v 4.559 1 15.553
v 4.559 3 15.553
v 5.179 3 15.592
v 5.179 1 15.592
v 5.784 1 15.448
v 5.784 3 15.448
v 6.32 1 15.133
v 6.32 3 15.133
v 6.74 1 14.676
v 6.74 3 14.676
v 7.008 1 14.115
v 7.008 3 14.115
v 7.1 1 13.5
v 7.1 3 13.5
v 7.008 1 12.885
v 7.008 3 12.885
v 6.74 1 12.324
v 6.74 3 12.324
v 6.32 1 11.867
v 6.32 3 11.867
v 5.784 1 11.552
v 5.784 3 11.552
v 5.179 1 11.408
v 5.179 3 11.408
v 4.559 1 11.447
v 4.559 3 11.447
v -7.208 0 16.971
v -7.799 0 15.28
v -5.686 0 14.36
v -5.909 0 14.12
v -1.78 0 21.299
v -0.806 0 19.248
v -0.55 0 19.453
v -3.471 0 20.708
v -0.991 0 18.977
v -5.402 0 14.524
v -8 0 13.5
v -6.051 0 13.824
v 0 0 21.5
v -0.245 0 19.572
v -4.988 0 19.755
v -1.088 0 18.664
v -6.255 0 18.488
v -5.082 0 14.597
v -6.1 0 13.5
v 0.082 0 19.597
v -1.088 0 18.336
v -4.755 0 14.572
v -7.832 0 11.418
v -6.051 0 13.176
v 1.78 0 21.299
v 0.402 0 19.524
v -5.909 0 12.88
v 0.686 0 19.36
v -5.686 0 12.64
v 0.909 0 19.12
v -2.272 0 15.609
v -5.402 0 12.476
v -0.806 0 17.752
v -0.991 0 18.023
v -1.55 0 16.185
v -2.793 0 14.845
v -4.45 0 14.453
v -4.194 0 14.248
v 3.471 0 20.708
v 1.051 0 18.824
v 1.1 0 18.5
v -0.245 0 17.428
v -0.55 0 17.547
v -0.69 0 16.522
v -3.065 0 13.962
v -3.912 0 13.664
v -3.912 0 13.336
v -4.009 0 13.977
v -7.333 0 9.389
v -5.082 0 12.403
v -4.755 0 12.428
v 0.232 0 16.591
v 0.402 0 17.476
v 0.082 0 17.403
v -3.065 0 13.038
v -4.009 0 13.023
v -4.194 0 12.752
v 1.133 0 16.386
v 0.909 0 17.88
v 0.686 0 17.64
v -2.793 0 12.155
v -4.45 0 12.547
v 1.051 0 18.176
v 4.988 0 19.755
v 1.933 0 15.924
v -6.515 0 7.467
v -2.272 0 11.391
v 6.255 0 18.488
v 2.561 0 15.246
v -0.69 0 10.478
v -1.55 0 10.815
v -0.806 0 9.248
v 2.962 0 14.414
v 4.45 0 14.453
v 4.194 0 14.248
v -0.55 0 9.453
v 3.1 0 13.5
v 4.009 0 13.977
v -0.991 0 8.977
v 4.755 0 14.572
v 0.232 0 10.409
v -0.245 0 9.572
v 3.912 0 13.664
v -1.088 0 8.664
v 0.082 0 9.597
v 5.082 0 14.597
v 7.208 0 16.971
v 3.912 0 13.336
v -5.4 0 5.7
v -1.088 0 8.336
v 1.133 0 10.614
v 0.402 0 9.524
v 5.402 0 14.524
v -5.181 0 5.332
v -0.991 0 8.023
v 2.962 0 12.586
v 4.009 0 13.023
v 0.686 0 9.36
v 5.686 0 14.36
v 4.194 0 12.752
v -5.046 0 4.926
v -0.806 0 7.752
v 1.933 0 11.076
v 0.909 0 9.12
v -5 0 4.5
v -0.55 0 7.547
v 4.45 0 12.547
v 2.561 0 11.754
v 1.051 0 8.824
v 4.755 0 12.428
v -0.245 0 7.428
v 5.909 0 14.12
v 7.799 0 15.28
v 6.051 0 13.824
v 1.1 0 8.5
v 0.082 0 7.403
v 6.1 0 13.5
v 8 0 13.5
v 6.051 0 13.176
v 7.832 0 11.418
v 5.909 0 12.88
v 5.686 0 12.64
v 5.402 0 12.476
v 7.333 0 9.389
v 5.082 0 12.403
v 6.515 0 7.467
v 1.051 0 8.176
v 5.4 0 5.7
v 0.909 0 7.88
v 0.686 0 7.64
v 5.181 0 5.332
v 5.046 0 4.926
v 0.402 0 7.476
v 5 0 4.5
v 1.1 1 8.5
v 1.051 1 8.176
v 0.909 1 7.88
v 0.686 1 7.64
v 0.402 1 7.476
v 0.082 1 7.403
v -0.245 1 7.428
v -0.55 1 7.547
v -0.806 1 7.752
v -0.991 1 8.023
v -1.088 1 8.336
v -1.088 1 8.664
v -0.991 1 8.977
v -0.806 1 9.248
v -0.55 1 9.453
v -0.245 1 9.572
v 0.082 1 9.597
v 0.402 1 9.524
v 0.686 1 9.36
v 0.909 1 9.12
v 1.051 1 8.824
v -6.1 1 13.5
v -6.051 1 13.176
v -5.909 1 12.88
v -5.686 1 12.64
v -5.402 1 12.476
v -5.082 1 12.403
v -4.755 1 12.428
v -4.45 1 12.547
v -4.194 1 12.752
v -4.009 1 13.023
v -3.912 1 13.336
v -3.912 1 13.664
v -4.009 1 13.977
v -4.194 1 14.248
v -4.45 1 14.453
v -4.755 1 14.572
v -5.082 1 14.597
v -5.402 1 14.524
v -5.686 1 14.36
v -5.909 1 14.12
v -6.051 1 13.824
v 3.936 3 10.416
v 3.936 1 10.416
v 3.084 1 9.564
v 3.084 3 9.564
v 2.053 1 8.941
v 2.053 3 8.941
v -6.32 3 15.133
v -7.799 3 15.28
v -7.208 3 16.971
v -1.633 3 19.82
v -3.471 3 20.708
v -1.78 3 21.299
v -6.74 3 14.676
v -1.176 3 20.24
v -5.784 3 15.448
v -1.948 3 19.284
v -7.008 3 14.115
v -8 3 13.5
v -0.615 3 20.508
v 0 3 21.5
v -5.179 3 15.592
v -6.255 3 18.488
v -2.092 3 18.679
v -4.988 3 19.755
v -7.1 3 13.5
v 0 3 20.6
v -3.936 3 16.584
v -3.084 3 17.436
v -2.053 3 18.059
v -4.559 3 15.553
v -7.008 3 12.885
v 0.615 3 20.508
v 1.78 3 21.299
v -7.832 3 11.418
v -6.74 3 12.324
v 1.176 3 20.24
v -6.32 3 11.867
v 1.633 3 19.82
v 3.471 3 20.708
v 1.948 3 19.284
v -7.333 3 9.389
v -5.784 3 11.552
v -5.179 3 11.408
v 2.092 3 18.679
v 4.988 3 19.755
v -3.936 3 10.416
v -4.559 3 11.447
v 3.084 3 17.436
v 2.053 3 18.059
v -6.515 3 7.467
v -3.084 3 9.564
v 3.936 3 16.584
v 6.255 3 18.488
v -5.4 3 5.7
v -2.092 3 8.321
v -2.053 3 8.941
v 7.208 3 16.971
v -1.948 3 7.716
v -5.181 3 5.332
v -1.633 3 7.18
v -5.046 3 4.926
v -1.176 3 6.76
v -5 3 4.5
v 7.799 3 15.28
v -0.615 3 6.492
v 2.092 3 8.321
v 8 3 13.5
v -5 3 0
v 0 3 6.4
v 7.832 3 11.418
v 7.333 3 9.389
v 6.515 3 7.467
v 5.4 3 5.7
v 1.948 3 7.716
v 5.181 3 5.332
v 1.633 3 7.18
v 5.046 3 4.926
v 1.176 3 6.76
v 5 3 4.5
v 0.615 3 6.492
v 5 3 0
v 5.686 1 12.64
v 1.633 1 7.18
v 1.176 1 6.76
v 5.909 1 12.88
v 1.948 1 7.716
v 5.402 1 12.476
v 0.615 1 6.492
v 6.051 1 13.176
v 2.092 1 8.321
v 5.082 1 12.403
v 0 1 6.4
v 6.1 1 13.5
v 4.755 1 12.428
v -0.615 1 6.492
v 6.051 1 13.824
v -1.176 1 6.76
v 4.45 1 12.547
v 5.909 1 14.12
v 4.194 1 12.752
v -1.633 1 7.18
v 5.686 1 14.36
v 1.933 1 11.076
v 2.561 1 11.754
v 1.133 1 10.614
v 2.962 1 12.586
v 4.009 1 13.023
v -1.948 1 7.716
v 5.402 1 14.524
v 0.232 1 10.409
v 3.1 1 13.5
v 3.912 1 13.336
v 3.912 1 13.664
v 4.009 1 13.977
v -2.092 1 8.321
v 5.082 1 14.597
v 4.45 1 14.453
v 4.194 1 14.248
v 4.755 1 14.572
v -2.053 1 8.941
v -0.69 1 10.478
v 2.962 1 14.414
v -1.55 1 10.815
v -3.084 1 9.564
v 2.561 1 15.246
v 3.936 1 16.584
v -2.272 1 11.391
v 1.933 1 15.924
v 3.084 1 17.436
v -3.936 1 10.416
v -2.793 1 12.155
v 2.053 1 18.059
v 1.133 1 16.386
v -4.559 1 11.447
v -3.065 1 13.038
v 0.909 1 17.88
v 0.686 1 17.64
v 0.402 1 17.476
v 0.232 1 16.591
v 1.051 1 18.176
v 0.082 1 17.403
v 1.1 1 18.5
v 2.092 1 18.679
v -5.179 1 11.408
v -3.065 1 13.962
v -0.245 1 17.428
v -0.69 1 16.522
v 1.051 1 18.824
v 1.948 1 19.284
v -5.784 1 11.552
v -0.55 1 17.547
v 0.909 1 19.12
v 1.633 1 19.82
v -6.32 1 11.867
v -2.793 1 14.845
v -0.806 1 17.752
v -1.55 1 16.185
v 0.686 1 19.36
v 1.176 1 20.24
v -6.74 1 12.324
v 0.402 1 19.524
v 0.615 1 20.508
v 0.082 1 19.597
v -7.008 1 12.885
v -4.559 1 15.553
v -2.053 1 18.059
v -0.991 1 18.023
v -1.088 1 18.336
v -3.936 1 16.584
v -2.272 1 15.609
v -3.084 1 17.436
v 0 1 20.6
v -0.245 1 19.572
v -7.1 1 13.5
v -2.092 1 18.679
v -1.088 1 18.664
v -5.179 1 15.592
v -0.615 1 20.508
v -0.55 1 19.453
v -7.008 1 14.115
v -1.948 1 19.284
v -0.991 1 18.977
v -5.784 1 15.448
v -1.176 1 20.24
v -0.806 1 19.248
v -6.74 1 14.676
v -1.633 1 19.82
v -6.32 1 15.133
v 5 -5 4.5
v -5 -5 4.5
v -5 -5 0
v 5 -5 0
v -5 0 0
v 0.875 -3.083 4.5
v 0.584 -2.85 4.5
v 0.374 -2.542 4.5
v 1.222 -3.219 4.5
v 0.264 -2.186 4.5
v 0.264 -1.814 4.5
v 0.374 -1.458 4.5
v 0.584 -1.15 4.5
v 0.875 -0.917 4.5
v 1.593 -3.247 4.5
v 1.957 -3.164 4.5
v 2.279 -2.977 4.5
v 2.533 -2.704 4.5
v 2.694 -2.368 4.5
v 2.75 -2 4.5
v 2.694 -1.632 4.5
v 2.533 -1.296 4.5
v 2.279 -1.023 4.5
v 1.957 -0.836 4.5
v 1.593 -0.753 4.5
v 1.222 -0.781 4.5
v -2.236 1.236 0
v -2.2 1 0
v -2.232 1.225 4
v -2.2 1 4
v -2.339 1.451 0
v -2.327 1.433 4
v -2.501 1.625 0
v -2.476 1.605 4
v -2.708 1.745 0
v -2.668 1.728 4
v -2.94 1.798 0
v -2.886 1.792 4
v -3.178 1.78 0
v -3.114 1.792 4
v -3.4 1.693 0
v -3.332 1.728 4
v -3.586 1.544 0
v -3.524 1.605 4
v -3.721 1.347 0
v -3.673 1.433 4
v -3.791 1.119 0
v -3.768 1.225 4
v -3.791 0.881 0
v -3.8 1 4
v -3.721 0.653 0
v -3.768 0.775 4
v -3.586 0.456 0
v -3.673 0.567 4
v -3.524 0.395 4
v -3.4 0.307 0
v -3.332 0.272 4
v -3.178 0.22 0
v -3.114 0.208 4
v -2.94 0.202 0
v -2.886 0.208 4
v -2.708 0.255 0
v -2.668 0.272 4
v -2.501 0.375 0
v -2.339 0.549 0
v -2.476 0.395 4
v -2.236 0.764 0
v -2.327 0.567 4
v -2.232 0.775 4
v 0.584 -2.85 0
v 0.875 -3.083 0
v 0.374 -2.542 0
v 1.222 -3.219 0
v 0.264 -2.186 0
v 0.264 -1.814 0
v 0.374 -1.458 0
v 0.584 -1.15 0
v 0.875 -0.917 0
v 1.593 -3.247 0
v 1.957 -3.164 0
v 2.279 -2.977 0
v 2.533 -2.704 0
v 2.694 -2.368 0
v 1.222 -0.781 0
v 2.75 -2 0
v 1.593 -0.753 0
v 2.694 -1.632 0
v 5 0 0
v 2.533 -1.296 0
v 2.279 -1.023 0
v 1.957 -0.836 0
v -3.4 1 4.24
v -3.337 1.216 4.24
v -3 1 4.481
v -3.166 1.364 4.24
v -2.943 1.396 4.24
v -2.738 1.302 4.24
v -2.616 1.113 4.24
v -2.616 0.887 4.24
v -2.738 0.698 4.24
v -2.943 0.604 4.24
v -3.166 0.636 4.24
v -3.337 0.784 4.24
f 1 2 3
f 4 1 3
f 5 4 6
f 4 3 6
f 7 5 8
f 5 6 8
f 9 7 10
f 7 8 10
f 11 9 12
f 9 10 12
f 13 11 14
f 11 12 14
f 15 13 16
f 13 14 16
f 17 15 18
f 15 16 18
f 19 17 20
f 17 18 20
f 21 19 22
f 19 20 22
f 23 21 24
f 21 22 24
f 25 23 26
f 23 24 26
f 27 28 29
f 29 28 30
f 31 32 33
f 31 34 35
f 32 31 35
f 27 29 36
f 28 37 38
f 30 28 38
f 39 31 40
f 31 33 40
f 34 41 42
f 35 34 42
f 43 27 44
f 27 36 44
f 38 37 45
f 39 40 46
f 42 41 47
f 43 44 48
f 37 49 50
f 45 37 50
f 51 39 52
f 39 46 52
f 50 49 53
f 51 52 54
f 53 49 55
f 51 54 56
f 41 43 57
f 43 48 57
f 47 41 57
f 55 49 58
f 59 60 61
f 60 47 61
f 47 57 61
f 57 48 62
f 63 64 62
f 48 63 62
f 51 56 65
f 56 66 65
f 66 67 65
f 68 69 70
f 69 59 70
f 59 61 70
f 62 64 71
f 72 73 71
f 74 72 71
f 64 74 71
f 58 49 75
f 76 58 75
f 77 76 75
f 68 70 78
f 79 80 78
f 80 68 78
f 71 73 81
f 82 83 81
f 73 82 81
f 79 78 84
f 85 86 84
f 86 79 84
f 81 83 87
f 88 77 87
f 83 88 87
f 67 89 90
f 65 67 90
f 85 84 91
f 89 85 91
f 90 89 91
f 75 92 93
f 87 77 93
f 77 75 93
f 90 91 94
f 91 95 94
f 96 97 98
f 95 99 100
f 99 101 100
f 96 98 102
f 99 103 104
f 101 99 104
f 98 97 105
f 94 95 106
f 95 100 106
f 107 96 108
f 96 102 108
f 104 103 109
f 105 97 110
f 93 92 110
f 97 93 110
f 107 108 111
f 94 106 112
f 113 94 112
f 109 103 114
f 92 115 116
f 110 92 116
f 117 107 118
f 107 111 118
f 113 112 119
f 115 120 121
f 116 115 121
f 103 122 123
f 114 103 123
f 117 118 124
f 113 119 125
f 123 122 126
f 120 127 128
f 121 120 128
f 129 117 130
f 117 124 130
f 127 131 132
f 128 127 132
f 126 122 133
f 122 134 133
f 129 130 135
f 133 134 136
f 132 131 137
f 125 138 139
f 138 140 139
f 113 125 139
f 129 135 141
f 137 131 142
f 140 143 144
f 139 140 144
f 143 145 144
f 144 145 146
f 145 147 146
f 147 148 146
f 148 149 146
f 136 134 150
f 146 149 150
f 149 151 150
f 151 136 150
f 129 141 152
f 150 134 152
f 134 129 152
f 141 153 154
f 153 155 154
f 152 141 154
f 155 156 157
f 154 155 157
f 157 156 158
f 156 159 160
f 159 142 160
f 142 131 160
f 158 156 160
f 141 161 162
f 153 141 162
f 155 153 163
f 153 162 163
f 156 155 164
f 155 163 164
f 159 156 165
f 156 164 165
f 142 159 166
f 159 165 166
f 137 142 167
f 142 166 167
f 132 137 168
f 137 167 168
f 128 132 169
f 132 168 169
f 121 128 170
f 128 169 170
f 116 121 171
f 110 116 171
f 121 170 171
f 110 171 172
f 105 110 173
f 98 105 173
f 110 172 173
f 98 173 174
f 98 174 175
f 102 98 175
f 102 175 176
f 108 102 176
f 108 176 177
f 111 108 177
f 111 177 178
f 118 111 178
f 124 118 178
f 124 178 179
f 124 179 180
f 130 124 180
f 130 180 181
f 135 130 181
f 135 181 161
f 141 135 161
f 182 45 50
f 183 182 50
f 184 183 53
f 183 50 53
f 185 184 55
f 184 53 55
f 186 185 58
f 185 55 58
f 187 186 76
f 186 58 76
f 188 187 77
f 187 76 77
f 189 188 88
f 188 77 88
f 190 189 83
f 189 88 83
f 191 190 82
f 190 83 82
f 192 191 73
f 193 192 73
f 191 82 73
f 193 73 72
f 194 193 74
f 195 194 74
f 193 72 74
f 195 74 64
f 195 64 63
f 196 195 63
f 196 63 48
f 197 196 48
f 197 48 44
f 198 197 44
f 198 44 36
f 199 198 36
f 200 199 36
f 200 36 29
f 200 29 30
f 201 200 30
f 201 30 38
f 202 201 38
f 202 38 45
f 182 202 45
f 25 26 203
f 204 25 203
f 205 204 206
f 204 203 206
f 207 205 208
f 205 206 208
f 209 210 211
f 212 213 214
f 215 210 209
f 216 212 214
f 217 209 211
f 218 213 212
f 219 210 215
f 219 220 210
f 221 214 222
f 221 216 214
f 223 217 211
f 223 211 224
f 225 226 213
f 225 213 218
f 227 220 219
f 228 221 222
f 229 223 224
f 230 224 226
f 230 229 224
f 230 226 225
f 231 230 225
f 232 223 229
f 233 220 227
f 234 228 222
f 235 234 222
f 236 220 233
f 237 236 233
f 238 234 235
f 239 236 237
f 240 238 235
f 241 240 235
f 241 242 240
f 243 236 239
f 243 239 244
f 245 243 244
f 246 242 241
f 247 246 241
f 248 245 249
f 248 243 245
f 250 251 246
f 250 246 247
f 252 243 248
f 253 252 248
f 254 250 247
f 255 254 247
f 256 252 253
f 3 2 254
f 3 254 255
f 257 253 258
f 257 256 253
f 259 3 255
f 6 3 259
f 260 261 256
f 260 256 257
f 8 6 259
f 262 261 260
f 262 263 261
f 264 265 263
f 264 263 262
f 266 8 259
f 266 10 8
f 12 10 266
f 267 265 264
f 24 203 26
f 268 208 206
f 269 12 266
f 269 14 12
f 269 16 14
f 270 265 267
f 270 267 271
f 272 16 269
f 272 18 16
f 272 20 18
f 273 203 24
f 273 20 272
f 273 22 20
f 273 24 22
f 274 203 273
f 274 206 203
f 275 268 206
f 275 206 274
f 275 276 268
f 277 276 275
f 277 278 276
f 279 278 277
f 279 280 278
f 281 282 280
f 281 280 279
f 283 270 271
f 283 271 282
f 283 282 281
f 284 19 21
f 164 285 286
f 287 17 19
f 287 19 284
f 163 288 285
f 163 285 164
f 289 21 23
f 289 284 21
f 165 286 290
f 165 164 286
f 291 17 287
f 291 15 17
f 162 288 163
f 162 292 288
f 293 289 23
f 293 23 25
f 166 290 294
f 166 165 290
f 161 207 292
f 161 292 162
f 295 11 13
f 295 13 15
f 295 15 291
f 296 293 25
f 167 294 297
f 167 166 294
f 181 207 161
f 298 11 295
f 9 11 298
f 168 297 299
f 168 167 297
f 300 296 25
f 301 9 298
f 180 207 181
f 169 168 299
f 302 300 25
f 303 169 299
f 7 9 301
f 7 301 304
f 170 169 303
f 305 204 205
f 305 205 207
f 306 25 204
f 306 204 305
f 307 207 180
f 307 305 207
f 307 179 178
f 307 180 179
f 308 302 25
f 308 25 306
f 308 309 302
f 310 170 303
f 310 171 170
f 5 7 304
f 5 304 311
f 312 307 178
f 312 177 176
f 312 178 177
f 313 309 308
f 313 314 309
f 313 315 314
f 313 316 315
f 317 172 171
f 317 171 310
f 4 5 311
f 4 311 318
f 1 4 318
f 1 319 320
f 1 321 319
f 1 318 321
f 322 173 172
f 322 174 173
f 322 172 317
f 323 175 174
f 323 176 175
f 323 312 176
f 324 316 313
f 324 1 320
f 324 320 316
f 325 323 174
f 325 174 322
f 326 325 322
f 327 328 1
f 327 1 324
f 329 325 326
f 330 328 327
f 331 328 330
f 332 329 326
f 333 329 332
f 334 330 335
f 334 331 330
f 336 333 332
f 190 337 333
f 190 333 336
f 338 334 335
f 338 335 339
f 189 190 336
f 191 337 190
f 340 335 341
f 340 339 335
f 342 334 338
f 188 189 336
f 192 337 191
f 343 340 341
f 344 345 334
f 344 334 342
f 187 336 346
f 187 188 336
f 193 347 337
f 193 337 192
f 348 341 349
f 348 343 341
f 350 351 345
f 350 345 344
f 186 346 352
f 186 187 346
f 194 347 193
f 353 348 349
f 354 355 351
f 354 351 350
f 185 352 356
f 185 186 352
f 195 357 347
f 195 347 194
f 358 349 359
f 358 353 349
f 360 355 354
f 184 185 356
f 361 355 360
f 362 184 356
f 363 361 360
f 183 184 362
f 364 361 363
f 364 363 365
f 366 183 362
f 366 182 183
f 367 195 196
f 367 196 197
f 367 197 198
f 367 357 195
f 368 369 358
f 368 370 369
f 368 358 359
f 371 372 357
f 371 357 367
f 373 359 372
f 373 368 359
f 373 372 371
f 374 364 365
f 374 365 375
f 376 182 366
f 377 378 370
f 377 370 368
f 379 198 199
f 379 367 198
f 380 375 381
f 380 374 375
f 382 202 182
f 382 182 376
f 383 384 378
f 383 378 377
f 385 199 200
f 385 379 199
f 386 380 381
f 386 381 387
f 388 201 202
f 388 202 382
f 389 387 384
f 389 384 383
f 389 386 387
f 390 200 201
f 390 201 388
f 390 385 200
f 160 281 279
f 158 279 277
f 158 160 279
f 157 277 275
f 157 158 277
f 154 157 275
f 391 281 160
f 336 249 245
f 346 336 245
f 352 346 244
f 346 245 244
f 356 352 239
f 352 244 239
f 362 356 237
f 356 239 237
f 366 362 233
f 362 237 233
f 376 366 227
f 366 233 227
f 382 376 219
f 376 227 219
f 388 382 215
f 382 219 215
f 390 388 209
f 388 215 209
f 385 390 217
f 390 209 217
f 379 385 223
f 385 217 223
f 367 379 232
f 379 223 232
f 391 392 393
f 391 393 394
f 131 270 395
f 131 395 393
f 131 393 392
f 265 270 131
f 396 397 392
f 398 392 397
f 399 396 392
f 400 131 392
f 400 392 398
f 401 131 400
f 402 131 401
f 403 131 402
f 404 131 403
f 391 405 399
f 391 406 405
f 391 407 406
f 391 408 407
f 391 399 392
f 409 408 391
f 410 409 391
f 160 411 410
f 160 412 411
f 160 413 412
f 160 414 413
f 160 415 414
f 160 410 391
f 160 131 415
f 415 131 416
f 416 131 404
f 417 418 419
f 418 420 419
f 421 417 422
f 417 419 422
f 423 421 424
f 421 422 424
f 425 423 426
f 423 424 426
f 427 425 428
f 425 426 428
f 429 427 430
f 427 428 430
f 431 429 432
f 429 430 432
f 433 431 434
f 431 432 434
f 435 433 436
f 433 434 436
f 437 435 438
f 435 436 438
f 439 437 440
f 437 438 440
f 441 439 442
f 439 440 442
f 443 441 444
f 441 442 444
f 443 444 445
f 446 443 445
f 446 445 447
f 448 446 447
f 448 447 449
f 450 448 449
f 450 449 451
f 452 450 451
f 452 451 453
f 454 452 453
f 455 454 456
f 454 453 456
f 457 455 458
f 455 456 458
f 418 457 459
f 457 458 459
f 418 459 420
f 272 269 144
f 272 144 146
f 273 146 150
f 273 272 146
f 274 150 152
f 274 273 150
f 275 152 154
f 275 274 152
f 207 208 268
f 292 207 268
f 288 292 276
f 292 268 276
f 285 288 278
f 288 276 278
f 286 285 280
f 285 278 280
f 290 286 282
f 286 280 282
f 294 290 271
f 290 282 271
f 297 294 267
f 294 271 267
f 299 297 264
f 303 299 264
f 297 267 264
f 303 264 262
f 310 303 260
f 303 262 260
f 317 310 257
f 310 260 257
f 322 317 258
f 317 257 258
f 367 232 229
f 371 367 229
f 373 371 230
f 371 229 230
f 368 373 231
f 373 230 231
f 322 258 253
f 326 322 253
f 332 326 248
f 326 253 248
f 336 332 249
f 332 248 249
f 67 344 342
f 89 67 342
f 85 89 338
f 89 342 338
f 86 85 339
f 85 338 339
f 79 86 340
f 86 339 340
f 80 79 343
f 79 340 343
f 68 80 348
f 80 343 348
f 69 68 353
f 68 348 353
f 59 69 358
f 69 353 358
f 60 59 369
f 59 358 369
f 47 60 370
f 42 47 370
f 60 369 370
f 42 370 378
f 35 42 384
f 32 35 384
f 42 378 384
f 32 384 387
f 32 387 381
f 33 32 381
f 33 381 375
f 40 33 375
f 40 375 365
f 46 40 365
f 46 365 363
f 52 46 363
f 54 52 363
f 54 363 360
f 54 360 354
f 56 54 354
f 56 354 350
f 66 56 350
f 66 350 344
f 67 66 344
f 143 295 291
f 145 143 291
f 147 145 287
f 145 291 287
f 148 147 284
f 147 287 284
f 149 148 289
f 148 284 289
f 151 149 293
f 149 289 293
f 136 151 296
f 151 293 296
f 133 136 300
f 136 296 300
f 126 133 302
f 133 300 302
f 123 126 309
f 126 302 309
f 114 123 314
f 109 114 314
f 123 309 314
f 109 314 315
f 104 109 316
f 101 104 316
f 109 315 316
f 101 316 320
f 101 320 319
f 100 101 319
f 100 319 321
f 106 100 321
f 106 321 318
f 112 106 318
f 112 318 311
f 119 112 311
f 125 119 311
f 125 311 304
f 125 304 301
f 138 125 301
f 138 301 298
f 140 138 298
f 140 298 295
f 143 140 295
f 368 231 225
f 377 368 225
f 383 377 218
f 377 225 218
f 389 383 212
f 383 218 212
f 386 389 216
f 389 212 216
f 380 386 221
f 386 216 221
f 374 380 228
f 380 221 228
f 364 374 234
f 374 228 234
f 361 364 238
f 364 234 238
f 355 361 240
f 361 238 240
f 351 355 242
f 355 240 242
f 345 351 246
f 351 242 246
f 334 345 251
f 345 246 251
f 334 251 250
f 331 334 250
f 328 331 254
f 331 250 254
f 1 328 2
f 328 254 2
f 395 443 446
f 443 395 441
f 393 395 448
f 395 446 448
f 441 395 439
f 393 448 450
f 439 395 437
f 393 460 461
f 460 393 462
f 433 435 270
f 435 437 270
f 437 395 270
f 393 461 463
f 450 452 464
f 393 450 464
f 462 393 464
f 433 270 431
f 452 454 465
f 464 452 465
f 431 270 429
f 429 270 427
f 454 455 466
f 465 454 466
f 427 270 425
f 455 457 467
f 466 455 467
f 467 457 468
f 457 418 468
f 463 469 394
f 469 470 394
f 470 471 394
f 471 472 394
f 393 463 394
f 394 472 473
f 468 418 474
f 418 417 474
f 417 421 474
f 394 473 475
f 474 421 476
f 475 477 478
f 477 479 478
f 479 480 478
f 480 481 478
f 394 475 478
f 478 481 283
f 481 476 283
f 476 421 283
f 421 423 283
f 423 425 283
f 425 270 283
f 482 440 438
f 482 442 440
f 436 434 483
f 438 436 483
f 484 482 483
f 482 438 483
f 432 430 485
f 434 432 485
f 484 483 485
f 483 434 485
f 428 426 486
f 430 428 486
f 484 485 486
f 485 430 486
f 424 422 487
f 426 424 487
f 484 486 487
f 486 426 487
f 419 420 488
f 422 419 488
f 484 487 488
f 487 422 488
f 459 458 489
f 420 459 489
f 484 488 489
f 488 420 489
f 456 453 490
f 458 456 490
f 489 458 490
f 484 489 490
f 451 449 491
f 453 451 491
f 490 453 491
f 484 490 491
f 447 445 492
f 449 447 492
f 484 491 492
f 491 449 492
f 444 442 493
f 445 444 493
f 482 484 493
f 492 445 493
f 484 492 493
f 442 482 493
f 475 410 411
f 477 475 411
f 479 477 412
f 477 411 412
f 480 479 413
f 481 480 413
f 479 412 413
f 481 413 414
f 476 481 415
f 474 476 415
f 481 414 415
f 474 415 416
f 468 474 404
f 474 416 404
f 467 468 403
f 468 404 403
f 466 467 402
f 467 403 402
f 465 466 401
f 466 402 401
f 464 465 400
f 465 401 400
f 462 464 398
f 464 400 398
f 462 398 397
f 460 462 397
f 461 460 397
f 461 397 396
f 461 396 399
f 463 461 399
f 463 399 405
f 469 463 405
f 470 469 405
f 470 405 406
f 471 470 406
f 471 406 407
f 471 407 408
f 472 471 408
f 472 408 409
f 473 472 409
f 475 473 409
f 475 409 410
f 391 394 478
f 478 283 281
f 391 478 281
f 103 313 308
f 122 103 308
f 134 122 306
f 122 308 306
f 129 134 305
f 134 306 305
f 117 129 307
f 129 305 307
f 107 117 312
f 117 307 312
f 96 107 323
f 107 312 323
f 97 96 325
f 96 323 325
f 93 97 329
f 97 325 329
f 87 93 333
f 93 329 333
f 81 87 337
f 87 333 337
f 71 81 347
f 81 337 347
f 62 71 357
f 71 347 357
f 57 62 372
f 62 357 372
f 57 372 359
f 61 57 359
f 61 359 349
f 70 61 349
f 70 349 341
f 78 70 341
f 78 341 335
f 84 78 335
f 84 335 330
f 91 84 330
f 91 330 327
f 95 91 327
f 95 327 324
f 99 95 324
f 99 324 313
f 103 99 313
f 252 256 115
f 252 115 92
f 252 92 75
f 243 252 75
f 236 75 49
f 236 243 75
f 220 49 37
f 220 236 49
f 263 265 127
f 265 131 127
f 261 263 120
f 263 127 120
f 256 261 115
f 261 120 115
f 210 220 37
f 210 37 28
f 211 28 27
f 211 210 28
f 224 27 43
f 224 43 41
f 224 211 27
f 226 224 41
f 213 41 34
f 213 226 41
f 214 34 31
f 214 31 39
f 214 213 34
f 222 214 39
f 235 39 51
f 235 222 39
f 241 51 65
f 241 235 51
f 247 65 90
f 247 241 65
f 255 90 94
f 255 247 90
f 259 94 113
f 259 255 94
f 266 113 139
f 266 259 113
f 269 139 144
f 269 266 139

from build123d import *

# Parameters (mm, degrees)
BOSS_EXTRUDE1_DEPTH            = 3
SKETCH2_W                      = 10
SKETCH2_H                      = 4.5
BOSS_EXTRUDE2_DEPTH            = 5
CUT_EXTRUDE1_DEPTH             = 2
F_2_2_2_2_DIAMETER_HOLE1_D     = 2.2
F_2_2_2_2_DIAMETER_HOLE1_DEPTH = 6.000025
F_6_2_6_2_DIAMETER_HOLE1_D     = 6.2
F_6_2_6_2_DIAMETER_HOLE1_DEPTH = 3
F_2_2_2_2_DIAMETER_HOLE2_D     = 2.2
F_2_2_2_2_DIAMETER_HOLE2_DEPTH = 3
F_2_5_2_5_DIAMETER_HOLE1_D     = 2.5
F_2_5_2_5_DIAMETER_HOLE1_DEPTH = 21.5
F_1_6_1_6_DIAMETER_HOLE1_D     = 1.6
F_1_6_1_6_DIAMETER_HOLE1_DEPTH = 4
F_1_6_1_6_DIAMETER_HOLE1_TIP   = 0.480688495
FILLET1_R                      = 2


with BuildPart() as part:
    # Sketch1 → Boss-Extrude1 (new body)
    with BuildSketch(Plane(origin=(0, 3, 0), x_dir=(1, 0, 0), z_dir=(0, 1, 0))):
        with BuildLine():
            Line((5.000000003, -5.193376137), (5.000000003, 0))
            Line((5.000000003, 0), (-4.999999997, 0))
            Line((-4.999999997, 0), (-4.999999997, -5.193376137))
            ThreePointArc((-4.999999997, -5.193376137), (-7.227019257, -9.084119567), (-7.999999997, -13.5))
            ThreePointArc((-7.999999997, -13.5), (3e-09, -21.5), (8.000000003, -13.5))
            ThreePointArc((8.000000003, -13.5), (7.227019264, -9.084119567), (5.000000003, -5.193376137))
        make_face()
    extrude(amount=-BOSS_EXTRUDE1_DEPTH)

    # Sketch2 → Boss-Extrude2 (add)
    with BuildSketch(Plane.XZ):
        with Locations((0, 2.25)):
            Rectangle(SKETCH2_W, SKETCH2_H)
    extrude(amount=BOSS_EXTRUDE2_DEPTH)

    # Sketch3 → Cut-Extrude1 (cut)
    with BuildSketch(Plane(origin=(0, 3, 0), x_dir=(-1, 0, 0), z_dir=(0, 1, 0))):
        with BuildLine():
            ThreePointArc((-2.053172912, 18.058999999), (-3.535533906, 17.035533905), (-4.559, 15.55317291))
            ThreePointArc((-4.559, 15.55317291), (-7.1, 13.5), (-4.559, 11.44682709))
            ThreePointArc((-4.559, 11.44682709), (-3.535533906, 9.964466094), (-2.053172911, 8.941))
            ThreePointArc((-2.053172911, 8.941), (0, 6.4), (2.05317291, 8.941))
            ThreePointArc((2.05317291, 8.941), (3.535533906, 9.964466094), (4.559, 11.44682709))
            ThreePointArc((4.559, 11.44682709), (7.1, 13.5), (4.559, 15.55317291))
            ThreePointArc((4.559, 15.55317291), (3.535533906, 17.035533906), (2.05317291, 18.059))
            ThreePointArc((2.05317291, 18.059), (-1e-09, 20.6), (-2.053172912, 18.058999999))
        make_face()
    extrude(amount=-CUT_EXTRUDE1_DEPTH, mode=Mode.SUBTRACT)

    # Ø2.2 (2.2) Diameter Hole1
    with Locations(Plane(origin=(0, 1, 0), x_dir=(1, 0, 0), z_dir=(0, 1, 0))):
        with Locations((-5, -13.5)):
            Hole(F_2_2_2_2_DIAMETER_HOLE1_D / 2, depth=F_2_2_2_2_DIAMETER_HOLE1_DEPTH)

    # Ø6.2 (6.2) Diameter Hole1
    with Locations(Plane(origin=(0, 0, 0), x_dir=(-1, 0, 0), z_dir=(0, -1, 0))):
        with Locations((0, -13.5)):
            Hole(F_6_2_6_2_DIAMETER_HOLE1_D / 2, depth=F_6_2_6_2_DIAMETER_HOLE1_DEPTH)

    # Ø2.2 (2.2) Diameter Hole2
    with Locations(Plane(origin=(0, 0, 0), x_dir=(-1, 0, 0), z_dir=(0, -1, 0))):
        with Locations((0, -8.5), (-5, -13.5), (0, -18.5)):
            Hole(F_2_2_2_2_DIAMETER_HOLE2_D / 2, depth=F_2_2_2_2_DIAMETER_HOLE2_DEPTH)

    # Ø2.5 (2.5) Diameter Hole1
    with Locations(Plane(origin=(0, 0, 0), x_dir=(-1, 0, 0), z_dir=(0, 0, -1))):
        with Locations((-1.5, -2)):
            Hole(F_2_5_2_5_DIAMETER_HOLE1_D / 2, depth=F_2_5_2_5_DIAMETER_HOLE1_DEPTH)

    # Ø1.6 (1.6) Diameter Hole1
    with Locations(Plane(origin=(0, 0, 0), x_dir=(-1, 0, 0), z_dir=(0, 0, -1))):
        with Locations((3, 1)):
            Hole(F_1_6_1_6_DIAMETER_HOLE1_D / 2, depth=F_1_6_1_6_DIAMETER_HOLE1_DEPTH)
            with Locations((0, 0, -(F_1_6_1_6_DIAMETER_HOLE1_DEPTH + F_1_6_1_6_DIAMETER_HOLE1_TIP / 2))):  # 118° drill point
                Cone(0, F_1_6_1_6_DIAMETER_HOLE1_D / 2, F_1_6_1_6_DIAMETER_HOLE1_TIP, mode=Mode.SUBTRACT)

    # Fillet1
    fillet1_edges = [part.edges().sort_by_distance(p)[0] for p in [
        (5.000000003, 1.5, 5.193376137),
        (-4.999999997, 1.5, 5.193376137),
    ]]
    fillet(fillet1_edges, radius=FILLET1_R)


solid = part.part
